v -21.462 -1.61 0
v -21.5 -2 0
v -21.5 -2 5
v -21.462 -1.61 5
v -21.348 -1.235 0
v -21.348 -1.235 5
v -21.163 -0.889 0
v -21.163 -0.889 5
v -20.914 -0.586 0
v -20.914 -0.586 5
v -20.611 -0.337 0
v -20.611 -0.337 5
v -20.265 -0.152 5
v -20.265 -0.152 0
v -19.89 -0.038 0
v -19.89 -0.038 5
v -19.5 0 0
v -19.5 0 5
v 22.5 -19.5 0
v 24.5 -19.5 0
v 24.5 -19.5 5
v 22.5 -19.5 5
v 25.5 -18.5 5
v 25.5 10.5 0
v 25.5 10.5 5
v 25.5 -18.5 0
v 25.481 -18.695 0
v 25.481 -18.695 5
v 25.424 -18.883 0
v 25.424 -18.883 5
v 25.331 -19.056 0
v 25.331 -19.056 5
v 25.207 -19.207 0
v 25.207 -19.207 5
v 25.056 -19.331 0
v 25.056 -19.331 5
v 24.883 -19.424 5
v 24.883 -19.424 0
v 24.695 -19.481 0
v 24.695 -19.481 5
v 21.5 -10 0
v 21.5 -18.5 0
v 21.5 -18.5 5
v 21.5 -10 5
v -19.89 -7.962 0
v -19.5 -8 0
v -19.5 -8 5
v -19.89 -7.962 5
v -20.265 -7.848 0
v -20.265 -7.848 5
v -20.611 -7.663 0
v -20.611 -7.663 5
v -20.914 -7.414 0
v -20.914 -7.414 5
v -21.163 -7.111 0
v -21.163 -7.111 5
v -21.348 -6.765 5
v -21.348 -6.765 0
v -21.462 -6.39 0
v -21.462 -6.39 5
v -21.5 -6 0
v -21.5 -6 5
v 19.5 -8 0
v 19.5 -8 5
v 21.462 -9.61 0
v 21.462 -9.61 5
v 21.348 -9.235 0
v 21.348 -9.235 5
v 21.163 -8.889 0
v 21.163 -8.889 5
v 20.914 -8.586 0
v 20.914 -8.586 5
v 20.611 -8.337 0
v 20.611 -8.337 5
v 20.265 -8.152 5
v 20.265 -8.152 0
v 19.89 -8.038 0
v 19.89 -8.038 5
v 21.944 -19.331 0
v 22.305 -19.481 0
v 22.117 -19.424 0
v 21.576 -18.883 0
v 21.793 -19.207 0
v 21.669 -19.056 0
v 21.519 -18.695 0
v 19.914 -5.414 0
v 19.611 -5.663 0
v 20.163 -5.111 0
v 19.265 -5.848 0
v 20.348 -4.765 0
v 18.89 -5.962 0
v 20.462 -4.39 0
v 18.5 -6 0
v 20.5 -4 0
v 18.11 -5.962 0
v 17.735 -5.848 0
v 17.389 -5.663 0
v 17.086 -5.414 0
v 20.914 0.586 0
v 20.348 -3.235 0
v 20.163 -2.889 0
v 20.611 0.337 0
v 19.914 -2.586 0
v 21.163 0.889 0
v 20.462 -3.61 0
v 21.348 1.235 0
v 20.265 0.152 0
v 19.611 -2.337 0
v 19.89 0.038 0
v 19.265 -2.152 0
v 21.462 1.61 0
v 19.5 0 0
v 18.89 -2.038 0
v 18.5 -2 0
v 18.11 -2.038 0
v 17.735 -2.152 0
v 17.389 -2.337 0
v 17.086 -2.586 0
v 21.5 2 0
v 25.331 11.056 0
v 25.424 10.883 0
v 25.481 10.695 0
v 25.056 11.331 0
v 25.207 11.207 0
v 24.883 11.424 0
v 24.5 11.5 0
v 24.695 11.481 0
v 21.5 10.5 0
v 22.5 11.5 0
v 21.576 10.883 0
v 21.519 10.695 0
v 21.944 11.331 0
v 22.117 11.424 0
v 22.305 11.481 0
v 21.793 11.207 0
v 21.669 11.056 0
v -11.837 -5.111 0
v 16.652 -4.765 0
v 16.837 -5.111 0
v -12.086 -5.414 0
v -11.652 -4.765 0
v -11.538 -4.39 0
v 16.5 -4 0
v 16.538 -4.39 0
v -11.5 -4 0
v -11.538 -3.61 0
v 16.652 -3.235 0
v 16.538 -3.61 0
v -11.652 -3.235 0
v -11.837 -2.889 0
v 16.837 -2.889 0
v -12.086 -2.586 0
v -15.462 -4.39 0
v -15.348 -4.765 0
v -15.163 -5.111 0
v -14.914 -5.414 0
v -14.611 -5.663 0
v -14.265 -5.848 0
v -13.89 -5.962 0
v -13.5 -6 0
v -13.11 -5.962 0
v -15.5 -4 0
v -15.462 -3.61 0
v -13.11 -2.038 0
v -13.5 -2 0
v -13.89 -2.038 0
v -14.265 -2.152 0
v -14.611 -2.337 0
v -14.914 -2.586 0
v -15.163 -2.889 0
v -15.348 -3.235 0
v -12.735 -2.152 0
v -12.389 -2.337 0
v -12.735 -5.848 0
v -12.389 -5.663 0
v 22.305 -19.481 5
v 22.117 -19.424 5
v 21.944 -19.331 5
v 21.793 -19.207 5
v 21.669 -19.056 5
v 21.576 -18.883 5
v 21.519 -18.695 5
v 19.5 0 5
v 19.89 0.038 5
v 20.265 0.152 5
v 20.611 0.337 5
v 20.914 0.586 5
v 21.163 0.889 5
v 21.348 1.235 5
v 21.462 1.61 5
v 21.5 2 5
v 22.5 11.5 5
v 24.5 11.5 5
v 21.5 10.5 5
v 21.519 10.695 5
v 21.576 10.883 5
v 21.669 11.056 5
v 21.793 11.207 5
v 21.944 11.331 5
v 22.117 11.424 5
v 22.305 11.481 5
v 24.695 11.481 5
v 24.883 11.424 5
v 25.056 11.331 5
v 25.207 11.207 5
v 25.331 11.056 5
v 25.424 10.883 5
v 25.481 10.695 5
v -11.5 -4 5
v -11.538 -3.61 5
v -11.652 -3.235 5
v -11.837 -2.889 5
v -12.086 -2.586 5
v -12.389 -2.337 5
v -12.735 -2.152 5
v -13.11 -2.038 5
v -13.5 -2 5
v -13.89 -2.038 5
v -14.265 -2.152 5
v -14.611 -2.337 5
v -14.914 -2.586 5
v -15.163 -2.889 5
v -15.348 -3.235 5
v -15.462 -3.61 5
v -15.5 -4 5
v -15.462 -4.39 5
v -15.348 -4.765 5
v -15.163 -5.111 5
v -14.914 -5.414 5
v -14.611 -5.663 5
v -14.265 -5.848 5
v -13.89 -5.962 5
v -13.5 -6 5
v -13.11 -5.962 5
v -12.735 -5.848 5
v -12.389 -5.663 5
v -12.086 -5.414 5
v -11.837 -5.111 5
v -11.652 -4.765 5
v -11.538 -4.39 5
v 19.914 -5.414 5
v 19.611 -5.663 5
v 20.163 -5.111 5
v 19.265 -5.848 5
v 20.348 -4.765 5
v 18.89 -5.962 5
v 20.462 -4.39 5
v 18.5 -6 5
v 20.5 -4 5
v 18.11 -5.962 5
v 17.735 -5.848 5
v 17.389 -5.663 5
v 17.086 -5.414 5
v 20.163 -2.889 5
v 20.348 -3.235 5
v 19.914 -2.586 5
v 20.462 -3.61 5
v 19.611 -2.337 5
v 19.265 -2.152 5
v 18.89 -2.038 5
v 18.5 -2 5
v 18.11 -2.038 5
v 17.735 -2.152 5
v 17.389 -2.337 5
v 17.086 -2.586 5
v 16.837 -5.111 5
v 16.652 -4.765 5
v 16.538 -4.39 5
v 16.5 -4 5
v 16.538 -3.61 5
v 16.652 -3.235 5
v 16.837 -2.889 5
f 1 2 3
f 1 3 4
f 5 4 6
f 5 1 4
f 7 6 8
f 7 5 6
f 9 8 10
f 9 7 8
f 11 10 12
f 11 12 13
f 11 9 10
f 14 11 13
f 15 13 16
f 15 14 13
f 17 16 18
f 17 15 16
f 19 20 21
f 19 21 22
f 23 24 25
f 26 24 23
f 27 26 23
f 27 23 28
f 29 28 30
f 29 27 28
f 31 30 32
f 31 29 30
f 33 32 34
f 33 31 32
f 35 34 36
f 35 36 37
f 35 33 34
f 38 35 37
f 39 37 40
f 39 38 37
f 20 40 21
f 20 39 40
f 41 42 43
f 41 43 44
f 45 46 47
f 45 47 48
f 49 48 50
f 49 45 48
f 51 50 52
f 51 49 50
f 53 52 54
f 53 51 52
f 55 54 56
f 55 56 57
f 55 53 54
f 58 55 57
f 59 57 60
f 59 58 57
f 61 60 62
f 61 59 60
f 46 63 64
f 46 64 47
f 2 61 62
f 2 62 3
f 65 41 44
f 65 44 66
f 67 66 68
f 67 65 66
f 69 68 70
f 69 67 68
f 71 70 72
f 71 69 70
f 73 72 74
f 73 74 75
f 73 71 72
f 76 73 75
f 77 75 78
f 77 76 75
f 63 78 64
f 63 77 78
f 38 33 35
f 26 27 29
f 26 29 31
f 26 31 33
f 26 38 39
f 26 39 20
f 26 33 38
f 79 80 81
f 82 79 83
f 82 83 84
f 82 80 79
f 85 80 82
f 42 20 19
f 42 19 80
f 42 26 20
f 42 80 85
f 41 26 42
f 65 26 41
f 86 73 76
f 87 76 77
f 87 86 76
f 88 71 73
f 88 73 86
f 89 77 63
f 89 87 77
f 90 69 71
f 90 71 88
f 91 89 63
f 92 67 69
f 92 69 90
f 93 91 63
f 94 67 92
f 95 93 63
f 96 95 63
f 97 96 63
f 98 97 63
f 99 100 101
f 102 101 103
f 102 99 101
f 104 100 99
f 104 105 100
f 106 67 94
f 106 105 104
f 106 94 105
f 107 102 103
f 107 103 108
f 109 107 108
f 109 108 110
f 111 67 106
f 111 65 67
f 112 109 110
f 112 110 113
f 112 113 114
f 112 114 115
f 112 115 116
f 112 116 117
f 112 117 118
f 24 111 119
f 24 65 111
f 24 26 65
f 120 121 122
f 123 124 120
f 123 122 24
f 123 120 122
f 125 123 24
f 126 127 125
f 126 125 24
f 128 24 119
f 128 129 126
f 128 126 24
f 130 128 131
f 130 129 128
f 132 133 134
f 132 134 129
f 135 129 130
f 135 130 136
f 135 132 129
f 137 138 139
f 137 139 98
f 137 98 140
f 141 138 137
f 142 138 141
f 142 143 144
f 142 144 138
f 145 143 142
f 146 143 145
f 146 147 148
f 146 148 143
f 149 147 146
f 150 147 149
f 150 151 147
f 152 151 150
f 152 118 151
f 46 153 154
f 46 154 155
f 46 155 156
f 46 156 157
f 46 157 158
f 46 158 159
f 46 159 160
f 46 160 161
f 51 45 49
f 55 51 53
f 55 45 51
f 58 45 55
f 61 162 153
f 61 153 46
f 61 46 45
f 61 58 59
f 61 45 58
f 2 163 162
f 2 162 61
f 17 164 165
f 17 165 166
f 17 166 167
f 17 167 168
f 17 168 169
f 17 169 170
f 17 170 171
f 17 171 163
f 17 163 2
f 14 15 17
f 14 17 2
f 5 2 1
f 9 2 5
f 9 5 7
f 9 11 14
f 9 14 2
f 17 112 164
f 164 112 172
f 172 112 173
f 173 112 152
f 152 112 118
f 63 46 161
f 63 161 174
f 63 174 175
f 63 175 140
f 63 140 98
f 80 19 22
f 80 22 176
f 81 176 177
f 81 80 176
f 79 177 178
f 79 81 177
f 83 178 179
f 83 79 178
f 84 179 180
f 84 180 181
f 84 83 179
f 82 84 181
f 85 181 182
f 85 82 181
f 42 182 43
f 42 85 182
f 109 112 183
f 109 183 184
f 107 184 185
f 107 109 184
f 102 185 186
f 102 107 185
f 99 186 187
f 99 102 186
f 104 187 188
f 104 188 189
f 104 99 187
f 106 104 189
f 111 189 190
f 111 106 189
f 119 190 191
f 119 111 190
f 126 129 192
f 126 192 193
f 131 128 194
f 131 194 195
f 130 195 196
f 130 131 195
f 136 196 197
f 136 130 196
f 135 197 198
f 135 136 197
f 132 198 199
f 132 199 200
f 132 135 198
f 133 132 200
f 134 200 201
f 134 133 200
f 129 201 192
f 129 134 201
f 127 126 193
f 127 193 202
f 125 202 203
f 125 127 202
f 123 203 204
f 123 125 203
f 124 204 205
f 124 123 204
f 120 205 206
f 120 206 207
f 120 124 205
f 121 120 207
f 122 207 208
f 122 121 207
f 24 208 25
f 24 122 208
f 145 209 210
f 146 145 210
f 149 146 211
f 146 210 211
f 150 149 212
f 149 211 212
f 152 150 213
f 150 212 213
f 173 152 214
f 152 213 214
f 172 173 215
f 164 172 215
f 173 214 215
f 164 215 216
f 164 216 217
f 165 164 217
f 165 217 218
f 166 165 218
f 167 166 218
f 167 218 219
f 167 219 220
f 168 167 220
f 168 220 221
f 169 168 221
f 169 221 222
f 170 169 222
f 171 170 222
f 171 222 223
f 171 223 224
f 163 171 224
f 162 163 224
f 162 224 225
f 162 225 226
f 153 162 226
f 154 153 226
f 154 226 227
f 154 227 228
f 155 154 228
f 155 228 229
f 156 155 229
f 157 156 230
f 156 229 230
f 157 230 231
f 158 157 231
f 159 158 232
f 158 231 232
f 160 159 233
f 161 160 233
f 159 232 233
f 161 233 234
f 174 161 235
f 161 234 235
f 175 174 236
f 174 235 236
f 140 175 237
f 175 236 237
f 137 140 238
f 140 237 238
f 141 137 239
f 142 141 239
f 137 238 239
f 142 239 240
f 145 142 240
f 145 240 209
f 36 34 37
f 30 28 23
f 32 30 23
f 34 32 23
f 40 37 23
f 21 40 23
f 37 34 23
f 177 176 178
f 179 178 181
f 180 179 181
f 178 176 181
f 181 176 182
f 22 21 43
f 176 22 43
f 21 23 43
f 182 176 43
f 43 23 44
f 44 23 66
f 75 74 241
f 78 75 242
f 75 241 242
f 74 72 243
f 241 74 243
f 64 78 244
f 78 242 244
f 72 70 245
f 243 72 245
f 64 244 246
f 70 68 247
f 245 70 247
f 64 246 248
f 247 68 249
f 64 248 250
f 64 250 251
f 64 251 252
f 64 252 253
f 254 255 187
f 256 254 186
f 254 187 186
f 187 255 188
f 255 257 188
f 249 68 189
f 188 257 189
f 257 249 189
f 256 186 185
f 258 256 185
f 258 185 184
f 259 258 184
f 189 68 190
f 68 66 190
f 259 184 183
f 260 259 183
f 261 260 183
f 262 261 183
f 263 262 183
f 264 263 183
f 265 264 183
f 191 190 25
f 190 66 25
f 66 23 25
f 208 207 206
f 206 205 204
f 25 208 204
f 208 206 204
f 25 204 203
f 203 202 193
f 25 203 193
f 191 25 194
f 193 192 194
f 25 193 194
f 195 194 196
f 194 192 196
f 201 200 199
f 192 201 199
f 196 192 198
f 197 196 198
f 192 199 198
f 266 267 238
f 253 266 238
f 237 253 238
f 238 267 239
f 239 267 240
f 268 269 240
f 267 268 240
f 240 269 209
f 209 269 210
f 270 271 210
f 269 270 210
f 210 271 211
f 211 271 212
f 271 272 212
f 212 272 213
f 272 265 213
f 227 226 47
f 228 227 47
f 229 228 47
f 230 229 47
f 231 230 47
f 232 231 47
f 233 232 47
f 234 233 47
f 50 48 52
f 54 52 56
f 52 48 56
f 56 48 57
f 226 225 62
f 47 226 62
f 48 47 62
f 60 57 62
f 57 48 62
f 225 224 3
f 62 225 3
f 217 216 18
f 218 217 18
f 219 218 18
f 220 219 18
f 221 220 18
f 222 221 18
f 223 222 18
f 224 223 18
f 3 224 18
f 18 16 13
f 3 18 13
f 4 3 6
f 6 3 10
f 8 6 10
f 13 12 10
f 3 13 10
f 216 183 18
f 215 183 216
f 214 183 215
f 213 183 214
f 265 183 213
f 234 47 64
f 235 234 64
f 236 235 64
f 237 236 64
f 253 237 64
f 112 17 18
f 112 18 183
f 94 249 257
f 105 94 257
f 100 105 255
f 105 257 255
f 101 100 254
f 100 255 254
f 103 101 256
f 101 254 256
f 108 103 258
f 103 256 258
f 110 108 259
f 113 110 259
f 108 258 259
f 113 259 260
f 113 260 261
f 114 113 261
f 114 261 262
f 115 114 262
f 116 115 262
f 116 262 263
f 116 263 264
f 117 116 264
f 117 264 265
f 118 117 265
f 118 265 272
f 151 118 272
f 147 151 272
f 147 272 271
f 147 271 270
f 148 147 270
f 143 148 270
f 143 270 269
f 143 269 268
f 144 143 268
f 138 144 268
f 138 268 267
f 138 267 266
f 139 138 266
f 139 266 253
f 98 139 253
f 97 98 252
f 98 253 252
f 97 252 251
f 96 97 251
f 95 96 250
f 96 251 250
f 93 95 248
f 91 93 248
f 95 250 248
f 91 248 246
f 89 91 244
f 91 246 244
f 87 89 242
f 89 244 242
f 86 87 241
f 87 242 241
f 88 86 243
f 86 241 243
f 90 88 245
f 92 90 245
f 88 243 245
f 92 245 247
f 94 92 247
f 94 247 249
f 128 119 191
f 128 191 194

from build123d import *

# Parameters (mm, degrees)
BOSS_EXTRUDE1_DEPTH = 5
SKETCH2_R           = 2
CUT_EXTRUDE1_DEPTH  = 6


with BuildPart() as part:
    # Sketch1 → Boss-Extrude1 (new body)
    with BuildSketch(Plane.XY):
        with BuildLine():
            Line((-19.5, 0), (19.5, 0))
            ThreePointArc((19.5, 0), (20.914213562, 0.585786438), (21.5, 2))
            Line((21.5, 2), (21.5, 10.5))
            ThreePointArc((21.5, 10.5), (21.792893219, 11.207106781), (22.5, 11.5))
            Line((22.5, 11.5), (24.5, 11.5))
            ThreePointArc((24.5, 11.5), (25.207106781, 11.207106781), (25.5, 10.5))
            Line((25.5, 10.5), (25.5, -18.5))
            ThreePointArc((25.5, -18.5), (25.207106781, -19.207106781), (24.5, -19.5))
            Line((24.5, -19.5), (22.5, -19.5))
            ThreePointArc((22.5, -19.5), (21.792893219, -19.207106781), (21.5, -18.5))
            Line((21.5, -18.5), (21.5, -10))
            ThreePointArc((21.5, -10), (20.914213562, -8.585786438), (19.5, -8))
            Line((19.5, -8), (-19.5, -8))
            ThreePointArc((-19.5, -8), (-20.914213562, -7.414213562), (-21.5, -6))
            Line((-21.5, -6), (-21.5, -2))
            ThreePointArc((-21.5, -2), (-20.914213562, -0.585786438), (-19.5, 0))
        make_face()
    extrude(amount=BOSS_EXTRUDE1_DEPTH)

    # Sketch2 → Cut-Extrude1 (cut, through all)
    with BuildSketch(Plane.XY.offset(5)):
        with Locations((-13.5, -4)):
            Circle(SKETCH2_R)
        with Locations((18.5, -4)):
            Circle(SKETCH2_R)
    extrude(amount=-CUT_EXTRUDE1_DEPTH, mode=Mode.SUBTRACT)


solid = part.part
